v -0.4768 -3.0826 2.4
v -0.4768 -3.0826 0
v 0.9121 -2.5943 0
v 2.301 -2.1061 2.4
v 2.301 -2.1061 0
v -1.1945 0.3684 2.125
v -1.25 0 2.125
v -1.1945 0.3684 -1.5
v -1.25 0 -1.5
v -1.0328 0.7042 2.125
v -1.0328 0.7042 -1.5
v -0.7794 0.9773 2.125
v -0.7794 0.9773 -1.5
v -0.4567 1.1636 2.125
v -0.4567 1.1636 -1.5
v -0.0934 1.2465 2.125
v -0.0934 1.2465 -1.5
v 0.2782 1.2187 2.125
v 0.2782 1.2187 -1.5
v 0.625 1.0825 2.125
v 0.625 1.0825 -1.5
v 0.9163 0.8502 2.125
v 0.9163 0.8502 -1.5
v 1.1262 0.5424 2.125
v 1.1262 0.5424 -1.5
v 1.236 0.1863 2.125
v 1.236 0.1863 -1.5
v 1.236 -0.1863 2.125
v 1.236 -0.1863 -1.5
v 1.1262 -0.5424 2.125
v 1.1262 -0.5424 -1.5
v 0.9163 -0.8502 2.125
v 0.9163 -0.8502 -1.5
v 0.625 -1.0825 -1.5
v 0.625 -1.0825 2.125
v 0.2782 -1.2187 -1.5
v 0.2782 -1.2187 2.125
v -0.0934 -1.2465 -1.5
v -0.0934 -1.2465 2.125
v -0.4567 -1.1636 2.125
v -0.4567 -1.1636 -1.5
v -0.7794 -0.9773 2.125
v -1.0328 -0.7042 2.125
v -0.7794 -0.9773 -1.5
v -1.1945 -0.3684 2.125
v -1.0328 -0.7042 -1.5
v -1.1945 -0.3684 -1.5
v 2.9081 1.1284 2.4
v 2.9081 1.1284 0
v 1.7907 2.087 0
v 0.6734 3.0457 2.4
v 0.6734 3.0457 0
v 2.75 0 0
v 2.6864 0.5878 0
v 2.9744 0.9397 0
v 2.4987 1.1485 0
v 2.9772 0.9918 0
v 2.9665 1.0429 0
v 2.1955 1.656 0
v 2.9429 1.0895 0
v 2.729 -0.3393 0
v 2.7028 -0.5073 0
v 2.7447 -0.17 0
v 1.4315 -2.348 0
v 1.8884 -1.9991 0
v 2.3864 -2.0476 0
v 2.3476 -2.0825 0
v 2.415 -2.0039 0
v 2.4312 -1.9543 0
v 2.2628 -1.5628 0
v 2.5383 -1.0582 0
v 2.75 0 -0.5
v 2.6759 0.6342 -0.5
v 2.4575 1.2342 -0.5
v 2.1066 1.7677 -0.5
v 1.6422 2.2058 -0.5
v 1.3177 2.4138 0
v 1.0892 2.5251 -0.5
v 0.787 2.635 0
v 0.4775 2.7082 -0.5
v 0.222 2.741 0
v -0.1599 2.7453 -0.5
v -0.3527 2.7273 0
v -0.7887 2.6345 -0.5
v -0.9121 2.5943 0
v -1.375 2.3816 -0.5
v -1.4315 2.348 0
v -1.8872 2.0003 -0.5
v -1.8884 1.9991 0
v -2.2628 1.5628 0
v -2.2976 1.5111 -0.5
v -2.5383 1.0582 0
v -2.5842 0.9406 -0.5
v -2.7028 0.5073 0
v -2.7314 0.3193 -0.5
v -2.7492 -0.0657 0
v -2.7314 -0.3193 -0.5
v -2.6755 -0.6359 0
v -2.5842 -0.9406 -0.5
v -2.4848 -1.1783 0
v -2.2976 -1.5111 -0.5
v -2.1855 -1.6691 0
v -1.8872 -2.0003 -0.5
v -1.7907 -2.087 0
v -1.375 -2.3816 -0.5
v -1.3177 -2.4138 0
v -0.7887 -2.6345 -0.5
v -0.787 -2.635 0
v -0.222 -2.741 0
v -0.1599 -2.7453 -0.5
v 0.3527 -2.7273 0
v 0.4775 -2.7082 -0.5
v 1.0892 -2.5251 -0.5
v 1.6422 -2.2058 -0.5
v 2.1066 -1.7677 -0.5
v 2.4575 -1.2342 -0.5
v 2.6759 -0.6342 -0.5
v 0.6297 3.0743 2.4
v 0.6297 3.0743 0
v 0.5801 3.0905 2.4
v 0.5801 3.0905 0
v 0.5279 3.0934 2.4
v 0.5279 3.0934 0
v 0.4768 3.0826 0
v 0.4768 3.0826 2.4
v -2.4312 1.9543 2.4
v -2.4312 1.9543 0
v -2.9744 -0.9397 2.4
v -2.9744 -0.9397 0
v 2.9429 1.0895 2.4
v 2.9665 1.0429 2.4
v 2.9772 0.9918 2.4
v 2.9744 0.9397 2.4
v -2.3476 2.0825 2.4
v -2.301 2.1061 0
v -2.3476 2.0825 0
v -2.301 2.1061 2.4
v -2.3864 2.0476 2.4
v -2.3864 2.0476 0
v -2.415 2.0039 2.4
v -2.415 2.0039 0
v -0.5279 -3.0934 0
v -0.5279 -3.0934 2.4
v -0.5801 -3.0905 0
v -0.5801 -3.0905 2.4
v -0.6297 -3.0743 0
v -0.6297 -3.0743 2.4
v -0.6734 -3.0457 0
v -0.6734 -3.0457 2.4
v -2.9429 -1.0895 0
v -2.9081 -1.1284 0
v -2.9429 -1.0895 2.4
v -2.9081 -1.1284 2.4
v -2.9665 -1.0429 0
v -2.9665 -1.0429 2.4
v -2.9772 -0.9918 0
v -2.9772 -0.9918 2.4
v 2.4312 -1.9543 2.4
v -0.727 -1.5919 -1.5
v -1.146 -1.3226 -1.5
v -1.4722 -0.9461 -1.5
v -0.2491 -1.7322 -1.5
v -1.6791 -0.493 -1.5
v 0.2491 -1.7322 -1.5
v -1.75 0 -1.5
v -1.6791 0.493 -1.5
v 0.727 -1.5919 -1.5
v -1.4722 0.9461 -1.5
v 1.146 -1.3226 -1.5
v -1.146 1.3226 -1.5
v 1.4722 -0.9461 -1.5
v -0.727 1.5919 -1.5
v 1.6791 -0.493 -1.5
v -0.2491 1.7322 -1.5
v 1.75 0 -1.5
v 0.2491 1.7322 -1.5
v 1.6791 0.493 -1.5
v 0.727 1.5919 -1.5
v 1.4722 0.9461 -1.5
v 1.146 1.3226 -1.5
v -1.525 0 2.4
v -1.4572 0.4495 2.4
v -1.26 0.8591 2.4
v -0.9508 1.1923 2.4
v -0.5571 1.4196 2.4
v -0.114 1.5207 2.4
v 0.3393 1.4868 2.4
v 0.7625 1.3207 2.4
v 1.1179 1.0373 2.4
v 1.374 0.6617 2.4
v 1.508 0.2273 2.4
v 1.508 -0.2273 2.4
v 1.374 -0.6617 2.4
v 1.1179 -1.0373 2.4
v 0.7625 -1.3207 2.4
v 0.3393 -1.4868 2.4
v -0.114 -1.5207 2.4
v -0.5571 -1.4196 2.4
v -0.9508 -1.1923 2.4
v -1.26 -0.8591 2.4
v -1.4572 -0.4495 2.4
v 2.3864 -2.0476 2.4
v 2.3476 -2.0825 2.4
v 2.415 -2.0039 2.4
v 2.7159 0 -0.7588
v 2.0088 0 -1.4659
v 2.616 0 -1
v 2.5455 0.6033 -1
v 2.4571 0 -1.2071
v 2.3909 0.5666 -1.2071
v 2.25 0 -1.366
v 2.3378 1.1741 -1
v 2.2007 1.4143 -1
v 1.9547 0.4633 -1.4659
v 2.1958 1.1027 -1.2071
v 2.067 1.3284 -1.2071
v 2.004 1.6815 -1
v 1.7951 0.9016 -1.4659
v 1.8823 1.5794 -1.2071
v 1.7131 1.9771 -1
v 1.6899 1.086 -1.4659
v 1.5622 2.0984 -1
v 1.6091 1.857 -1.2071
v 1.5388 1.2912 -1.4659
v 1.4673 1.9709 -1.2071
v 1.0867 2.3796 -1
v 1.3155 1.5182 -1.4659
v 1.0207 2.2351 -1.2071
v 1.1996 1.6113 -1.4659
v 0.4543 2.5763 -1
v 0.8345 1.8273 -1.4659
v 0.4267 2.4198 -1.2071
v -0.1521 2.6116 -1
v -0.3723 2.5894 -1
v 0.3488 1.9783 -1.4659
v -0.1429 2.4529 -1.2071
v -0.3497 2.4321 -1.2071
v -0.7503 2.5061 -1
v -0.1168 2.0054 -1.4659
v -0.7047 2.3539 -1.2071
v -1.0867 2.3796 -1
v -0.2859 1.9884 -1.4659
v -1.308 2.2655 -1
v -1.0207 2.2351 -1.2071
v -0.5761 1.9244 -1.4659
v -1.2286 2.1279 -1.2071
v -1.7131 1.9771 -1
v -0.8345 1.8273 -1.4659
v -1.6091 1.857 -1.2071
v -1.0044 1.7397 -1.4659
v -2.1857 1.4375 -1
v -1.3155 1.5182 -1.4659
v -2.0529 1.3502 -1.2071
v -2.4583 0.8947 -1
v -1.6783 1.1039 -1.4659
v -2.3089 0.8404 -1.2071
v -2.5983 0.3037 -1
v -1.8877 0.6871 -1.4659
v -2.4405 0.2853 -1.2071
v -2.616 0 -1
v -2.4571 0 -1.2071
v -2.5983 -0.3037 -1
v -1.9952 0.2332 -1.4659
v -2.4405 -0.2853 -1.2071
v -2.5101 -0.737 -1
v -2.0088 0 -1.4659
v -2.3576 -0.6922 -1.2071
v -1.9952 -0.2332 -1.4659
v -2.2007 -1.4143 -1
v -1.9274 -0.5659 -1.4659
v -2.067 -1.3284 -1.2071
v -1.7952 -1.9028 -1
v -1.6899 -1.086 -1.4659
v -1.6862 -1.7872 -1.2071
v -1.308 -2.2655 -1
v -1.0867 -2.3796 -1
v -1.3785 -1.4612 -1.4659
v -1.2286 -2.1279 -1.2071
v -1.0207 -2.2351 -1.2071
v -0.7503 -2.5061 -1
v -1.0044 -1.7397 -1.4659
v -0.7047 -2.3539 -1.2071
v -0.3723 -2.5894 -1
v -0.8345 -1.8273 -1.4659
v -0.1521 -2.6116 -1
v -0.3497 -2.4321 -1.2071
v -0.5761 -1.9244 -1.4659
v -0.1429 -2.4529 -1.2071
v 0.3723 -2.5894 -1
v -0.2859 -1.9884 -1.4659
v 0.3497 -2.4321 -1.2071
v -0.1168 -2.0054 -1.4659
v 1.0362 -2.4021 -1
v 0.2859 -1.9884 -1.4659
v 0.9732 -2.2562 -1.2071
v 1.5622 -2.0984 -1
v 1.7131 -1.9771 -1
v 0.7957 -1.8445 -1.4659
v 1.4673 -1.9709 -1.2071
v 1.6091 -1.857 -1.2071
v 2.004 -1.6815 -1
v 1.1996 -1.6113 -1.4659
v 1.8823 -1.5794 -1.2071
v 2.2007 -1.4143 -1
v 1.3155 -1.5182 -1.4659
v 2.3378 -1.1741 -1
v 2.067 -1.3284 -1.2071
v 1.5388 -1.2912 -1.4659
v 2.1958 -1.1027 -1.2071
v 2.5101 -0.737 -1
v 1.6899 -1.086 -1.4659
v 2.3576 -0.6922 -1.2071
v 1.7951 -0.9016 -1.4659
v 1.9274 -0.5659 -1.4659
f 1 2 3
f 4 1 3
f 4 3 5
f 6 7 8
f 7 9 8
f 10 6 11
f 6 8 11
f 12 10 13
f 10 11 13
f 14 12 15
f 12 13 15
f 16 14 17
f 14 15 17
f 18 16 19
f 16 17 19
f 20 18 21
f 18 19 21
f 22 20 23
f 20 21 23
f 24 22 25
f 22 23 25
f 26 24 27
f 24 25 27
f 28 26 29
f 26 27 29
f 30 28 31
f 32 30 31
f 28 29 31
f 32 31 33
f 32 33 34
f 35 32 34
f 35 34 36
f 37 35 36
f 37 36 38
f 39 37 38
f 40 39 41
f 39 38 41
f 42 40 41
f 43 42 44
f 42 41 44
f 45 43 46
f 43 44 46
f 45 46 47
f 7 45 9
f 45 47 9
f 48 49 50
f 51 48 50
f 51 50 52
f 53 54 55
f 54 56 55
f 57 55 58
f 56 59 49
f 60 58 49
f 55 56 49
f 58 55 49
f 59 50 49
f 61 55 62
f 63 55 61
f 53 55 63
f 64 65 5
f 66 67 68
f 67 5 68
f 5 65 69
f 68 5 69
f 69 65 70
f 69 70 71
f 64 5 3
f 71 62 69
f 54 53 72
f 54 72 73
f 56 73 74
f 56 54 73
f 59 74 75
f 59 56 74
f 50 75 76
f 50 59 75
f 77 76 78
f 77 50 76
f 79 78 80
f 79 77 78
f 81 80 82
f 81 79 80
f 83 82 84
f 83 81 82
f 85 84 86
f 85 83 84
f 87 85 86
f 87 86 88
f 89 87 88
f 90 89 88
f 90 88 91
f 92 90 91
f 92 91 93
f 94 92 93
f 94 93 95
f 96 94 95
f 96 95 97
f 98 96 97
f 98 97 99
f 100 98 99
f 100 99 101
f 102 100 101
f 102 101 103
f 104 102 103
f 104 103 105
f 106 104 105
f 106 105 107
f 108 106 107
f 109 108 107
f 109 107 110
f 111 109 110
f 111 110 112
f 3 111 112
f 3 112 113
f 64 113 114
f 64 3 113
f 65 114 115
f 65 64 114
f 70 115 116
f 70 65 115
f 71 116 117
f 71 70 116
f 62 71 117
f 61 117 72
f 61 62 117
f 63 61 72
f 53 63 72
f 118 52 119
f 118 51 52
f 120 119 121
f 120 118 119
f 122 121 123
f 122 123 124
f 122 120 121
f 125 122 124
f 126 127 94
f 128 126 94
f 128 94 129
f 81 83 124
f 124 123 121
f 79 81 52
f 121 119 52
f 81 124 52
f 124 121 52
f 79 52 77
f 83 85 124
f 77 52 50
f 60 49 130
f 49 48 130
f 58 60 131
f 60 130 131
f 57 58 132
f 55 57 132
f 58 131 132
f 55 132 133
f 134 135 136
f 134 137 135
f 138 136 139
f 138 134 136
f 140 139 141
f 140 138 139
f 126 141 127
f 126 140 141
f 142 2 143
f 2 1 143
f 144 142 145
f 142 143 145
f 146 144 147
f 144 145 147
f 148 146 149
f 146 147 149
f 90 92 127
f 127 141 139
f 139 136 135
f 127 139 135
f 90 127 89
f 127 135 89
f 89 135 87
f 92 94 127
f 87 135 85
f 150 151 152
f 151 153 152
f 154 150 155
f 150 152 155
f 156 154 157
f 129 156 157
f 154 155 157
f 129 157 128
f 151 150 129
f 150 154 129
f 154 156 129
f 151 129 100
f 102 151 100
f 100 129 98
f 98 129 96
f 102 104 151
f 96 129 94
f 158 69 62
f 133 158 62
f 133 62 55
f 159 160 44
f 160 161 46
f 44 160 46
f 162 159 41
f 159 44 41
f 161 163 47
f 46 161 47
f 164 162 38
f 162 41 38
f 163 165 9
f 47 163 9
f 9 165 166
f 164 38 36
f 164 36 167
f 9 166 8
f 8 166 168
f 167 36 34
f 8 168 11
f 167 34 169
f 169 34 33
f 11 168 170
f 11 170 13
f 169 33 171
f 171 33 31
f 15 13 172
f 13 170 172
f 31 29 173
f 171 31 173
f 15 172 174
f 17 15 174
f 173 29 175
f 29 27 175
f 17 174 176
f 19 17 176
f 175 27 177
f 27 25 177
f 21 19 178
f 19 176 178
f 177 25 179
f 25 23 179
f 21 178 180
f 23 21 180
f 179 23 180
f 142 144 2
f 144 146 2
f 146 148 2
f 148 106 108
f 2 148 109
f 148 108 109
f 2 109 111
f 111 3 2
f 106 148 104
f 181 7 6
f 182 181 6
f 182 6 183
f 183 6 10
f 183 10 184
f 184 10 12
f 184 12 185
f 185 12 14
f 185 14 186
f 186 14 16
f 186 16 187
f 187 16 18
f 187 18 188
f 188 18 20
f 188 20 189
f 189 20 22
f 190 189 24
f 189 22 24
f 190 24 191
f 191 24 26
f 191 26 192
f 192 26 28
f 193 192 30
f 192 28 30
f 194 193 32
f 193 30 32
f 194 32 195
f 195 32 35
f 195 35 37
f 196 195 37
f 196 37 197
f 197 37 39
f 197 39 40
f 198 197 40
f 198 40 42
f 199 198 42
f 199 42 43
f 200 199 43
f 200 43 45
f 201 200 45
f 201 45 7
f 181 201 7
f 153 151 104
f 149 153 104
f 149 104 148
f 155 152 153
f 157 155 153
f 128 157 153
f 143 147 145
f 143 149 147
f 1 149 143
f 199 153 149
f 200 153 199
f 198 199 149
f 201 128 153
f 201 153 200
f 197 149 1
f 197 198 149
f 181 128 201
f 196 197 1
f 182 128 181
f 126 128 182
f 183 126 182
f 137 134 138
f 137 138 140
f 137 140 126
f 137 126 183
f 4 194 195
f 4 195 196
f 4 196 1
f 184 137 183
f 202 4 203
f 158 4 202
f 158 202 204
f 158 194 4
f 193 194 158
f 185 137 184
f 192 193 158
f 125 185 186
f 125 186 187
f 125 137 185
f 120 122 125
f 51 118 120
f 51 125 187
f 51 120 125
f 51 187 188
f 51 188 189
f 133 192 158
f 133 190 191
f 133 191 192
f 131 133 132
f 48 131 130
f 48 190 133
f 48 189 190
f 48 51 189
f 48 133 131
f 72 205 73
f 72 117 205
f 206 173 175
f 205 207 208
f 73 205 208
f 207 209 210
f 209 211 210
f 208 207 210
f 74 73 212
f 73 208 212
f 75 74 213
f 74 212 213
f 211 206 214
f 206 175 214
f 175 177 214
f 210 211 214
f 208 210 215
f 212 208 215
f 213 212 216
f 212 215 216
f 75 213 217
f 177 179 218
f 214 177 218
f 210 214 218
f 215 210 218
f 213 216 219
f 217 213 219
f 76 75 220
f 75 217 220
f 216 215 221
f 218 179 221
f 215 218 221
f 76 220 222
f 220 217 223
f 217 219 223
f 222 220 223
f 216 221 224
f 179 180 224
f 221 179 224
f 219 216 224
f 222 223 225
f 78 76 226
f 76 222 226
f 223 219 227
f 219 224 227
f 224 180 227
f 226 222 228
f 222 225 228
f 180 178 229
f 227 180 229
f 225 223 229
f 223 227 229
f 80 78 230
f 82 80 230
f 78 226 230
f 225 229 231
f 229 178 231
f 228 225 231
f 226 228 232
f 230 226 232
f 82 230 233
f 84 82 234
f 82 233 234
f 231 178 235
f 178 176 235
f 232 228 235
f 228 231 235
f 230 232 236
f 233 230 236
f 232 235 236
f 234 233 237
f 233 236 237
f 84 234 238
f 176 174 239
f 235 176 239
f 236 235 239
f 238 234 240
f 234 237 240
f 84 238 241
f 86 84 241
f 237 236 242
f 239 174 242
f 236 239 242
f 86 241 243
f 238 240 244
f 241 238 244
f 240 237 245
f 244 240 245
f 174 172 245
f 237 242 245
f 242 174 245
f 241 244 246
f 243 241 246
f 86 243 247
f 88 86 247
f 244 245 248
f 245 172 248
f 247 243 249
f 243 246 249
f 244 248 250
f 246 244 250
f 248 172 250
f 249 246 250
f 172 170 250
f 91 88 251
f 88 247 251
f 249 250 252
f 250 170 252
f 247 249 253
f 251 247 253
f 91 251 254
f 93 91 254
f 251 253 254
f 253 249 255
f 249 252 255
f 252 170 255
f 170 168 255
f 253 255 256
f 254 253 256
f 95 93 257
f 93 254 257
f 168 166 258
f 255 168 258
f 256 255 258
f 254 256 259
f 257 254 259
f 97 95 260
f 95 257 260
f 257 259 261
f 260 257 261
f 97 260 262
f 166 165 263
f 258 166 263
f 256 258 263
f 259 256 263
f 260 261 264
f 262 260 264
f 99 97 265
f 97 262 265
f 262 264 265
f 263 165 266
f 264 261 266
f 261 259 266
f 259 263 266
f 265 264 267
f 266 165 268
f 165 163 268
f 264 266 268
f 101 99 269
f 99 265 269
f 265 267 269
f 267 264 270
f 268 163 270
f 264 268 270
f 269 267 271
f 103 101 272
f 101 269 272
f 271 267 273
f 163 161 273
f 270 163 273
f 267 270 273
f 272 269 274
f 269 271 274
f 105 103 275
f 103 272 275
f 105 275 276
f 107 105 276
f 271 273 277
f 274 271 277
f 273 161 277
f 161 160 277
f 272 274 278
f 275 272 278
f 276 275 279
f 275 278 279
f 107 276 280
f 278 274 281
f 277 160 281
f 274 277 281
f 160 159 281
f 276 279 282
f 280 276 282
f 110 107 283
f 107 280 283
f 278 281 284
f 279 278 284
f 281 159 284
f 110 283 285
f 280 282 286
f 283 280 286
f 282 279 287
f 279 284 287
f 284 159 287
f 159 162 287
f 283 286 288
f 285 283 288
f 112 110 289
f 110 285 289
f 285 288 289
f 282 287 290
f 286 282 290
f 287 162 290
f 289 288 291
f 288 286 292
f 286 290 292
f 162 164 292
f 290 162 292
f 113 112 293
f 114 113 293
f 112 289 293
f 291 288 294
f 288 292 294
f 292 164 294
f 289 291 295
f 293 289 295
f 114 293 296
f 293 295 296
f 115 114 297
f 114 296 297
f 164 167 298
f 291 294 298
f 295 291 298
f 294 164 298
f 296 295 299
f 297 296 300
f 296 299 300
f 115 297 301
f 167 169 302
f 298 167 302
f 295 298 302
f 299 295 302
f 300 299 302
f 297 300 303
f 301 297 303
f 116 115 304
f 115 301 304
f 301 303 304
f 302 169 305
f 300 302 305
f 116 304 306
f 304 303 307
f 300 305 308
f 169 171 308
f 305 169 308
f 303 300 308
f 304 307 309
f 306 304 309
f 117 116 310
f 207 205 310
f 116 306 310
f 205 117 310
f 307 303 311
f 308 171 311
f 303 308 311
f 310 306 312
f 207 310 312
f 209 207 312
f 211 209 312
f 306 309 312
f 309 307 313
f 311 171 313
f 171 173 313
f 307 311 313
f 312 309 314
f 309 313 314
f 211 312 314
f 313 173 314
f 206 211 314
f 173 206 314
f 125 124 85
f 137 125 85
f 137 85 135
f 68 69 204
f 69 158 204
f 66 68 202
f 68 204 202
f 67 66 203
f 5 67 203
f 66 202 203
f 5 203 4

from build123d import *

# Parameters (mm, degrees)
EXTRUDE_1_DEPTH              = 2.4
SKETCH_2_R                   = 2.75
EXTRUDE_3_DEPTH              = 3.9
FILLET_1_R                   = 1
FILLET_2_R                   = 0.2
HOLE_WIZARD_M3_1_D           = 2.5
HOLE_WIZARD_M3_1_DEPTH       = 7.5
HOLE_WIZARD_M3_1_CSINK_D     = 3.05
HOLE_WIZARD_M3_1_CSINK_ANGLE = 90
HOLE_WIZARD_M3_1_TIP         = 0.751075774


with BuildPart() as part:
    # 草图1 → 凸台-拉伸1 (new body)
    with BuildSketch(Plane.XY):
        Polygon((2.409913138, -2.067764977), (2.995693568, 1.05316351), (0.58578043, 3.120928487), (-2.409913138, 2.067764977), (-2.995693568, -1.05316351), (-0.58578043, -3.120928487), align=None)
    extrude(amount=EXTRUDE_1_DEPTH)

    # 草图2 → 凸台-拉伸3 (add)
    with BuildSketch(Plane.XY.offset(2.4)):
        Circle(SKETCH_2_R)
    extrude(amount=-EXTRUDE_3_DEPTH)

    # 圆角1
    fillet_1_edges = [part.edges().sort_by_distance(p)[0] for p in [
        (-2.75, 0, -1.5),
    ]]
    fillet(fillet_1_edges, radius=FILLET_1_R)

    # 圆角2
    fillet_2_edges = [part.edges().sort_by_distance(p)[0] for p in [
        (-0.58578043, -3.120928487, 1.2),
        (-2.995693568, -1.05316351, 1.2),
        (-2.409913138, 2.067764977, 1.2),
        (0.58578043, 3.120928487, 1.2),
        (2.995693568, 1.05316351, 1.2),
        (2.409913138, -2.067764977, 1.2),
    ]]
    fillet(fillet_2_edges, radius=FILLET_2_R)

    # M3 螺纹孔1
    with Locations(Plane.XY.offset(2.4)):
        with Locations((0, 0)):
            CounterSinkHole(HOLE_WIZARD_M3_1_D / 2, HOLE_WIZARD_M3_1_CSINK_D / 2, depth=HOLE_WIZARD_M3_1_DEPTH, counter_sink_angle=HOLE_WIZARD_M3_1_CSINK_ANGLE)
            with Locations((0, 0, -(HOLE_WIZARD_M3_1_DEPTH + HOLE_WIZARD_M3_1_TIP / 2))):  # 118° drill point
                Cone(0, HOLE_WIZARD_M3_1_D / 2, HOLE_WIZARD_M3_1_TIP, mode=Mode.SUBTRACT)


solid = part.part
